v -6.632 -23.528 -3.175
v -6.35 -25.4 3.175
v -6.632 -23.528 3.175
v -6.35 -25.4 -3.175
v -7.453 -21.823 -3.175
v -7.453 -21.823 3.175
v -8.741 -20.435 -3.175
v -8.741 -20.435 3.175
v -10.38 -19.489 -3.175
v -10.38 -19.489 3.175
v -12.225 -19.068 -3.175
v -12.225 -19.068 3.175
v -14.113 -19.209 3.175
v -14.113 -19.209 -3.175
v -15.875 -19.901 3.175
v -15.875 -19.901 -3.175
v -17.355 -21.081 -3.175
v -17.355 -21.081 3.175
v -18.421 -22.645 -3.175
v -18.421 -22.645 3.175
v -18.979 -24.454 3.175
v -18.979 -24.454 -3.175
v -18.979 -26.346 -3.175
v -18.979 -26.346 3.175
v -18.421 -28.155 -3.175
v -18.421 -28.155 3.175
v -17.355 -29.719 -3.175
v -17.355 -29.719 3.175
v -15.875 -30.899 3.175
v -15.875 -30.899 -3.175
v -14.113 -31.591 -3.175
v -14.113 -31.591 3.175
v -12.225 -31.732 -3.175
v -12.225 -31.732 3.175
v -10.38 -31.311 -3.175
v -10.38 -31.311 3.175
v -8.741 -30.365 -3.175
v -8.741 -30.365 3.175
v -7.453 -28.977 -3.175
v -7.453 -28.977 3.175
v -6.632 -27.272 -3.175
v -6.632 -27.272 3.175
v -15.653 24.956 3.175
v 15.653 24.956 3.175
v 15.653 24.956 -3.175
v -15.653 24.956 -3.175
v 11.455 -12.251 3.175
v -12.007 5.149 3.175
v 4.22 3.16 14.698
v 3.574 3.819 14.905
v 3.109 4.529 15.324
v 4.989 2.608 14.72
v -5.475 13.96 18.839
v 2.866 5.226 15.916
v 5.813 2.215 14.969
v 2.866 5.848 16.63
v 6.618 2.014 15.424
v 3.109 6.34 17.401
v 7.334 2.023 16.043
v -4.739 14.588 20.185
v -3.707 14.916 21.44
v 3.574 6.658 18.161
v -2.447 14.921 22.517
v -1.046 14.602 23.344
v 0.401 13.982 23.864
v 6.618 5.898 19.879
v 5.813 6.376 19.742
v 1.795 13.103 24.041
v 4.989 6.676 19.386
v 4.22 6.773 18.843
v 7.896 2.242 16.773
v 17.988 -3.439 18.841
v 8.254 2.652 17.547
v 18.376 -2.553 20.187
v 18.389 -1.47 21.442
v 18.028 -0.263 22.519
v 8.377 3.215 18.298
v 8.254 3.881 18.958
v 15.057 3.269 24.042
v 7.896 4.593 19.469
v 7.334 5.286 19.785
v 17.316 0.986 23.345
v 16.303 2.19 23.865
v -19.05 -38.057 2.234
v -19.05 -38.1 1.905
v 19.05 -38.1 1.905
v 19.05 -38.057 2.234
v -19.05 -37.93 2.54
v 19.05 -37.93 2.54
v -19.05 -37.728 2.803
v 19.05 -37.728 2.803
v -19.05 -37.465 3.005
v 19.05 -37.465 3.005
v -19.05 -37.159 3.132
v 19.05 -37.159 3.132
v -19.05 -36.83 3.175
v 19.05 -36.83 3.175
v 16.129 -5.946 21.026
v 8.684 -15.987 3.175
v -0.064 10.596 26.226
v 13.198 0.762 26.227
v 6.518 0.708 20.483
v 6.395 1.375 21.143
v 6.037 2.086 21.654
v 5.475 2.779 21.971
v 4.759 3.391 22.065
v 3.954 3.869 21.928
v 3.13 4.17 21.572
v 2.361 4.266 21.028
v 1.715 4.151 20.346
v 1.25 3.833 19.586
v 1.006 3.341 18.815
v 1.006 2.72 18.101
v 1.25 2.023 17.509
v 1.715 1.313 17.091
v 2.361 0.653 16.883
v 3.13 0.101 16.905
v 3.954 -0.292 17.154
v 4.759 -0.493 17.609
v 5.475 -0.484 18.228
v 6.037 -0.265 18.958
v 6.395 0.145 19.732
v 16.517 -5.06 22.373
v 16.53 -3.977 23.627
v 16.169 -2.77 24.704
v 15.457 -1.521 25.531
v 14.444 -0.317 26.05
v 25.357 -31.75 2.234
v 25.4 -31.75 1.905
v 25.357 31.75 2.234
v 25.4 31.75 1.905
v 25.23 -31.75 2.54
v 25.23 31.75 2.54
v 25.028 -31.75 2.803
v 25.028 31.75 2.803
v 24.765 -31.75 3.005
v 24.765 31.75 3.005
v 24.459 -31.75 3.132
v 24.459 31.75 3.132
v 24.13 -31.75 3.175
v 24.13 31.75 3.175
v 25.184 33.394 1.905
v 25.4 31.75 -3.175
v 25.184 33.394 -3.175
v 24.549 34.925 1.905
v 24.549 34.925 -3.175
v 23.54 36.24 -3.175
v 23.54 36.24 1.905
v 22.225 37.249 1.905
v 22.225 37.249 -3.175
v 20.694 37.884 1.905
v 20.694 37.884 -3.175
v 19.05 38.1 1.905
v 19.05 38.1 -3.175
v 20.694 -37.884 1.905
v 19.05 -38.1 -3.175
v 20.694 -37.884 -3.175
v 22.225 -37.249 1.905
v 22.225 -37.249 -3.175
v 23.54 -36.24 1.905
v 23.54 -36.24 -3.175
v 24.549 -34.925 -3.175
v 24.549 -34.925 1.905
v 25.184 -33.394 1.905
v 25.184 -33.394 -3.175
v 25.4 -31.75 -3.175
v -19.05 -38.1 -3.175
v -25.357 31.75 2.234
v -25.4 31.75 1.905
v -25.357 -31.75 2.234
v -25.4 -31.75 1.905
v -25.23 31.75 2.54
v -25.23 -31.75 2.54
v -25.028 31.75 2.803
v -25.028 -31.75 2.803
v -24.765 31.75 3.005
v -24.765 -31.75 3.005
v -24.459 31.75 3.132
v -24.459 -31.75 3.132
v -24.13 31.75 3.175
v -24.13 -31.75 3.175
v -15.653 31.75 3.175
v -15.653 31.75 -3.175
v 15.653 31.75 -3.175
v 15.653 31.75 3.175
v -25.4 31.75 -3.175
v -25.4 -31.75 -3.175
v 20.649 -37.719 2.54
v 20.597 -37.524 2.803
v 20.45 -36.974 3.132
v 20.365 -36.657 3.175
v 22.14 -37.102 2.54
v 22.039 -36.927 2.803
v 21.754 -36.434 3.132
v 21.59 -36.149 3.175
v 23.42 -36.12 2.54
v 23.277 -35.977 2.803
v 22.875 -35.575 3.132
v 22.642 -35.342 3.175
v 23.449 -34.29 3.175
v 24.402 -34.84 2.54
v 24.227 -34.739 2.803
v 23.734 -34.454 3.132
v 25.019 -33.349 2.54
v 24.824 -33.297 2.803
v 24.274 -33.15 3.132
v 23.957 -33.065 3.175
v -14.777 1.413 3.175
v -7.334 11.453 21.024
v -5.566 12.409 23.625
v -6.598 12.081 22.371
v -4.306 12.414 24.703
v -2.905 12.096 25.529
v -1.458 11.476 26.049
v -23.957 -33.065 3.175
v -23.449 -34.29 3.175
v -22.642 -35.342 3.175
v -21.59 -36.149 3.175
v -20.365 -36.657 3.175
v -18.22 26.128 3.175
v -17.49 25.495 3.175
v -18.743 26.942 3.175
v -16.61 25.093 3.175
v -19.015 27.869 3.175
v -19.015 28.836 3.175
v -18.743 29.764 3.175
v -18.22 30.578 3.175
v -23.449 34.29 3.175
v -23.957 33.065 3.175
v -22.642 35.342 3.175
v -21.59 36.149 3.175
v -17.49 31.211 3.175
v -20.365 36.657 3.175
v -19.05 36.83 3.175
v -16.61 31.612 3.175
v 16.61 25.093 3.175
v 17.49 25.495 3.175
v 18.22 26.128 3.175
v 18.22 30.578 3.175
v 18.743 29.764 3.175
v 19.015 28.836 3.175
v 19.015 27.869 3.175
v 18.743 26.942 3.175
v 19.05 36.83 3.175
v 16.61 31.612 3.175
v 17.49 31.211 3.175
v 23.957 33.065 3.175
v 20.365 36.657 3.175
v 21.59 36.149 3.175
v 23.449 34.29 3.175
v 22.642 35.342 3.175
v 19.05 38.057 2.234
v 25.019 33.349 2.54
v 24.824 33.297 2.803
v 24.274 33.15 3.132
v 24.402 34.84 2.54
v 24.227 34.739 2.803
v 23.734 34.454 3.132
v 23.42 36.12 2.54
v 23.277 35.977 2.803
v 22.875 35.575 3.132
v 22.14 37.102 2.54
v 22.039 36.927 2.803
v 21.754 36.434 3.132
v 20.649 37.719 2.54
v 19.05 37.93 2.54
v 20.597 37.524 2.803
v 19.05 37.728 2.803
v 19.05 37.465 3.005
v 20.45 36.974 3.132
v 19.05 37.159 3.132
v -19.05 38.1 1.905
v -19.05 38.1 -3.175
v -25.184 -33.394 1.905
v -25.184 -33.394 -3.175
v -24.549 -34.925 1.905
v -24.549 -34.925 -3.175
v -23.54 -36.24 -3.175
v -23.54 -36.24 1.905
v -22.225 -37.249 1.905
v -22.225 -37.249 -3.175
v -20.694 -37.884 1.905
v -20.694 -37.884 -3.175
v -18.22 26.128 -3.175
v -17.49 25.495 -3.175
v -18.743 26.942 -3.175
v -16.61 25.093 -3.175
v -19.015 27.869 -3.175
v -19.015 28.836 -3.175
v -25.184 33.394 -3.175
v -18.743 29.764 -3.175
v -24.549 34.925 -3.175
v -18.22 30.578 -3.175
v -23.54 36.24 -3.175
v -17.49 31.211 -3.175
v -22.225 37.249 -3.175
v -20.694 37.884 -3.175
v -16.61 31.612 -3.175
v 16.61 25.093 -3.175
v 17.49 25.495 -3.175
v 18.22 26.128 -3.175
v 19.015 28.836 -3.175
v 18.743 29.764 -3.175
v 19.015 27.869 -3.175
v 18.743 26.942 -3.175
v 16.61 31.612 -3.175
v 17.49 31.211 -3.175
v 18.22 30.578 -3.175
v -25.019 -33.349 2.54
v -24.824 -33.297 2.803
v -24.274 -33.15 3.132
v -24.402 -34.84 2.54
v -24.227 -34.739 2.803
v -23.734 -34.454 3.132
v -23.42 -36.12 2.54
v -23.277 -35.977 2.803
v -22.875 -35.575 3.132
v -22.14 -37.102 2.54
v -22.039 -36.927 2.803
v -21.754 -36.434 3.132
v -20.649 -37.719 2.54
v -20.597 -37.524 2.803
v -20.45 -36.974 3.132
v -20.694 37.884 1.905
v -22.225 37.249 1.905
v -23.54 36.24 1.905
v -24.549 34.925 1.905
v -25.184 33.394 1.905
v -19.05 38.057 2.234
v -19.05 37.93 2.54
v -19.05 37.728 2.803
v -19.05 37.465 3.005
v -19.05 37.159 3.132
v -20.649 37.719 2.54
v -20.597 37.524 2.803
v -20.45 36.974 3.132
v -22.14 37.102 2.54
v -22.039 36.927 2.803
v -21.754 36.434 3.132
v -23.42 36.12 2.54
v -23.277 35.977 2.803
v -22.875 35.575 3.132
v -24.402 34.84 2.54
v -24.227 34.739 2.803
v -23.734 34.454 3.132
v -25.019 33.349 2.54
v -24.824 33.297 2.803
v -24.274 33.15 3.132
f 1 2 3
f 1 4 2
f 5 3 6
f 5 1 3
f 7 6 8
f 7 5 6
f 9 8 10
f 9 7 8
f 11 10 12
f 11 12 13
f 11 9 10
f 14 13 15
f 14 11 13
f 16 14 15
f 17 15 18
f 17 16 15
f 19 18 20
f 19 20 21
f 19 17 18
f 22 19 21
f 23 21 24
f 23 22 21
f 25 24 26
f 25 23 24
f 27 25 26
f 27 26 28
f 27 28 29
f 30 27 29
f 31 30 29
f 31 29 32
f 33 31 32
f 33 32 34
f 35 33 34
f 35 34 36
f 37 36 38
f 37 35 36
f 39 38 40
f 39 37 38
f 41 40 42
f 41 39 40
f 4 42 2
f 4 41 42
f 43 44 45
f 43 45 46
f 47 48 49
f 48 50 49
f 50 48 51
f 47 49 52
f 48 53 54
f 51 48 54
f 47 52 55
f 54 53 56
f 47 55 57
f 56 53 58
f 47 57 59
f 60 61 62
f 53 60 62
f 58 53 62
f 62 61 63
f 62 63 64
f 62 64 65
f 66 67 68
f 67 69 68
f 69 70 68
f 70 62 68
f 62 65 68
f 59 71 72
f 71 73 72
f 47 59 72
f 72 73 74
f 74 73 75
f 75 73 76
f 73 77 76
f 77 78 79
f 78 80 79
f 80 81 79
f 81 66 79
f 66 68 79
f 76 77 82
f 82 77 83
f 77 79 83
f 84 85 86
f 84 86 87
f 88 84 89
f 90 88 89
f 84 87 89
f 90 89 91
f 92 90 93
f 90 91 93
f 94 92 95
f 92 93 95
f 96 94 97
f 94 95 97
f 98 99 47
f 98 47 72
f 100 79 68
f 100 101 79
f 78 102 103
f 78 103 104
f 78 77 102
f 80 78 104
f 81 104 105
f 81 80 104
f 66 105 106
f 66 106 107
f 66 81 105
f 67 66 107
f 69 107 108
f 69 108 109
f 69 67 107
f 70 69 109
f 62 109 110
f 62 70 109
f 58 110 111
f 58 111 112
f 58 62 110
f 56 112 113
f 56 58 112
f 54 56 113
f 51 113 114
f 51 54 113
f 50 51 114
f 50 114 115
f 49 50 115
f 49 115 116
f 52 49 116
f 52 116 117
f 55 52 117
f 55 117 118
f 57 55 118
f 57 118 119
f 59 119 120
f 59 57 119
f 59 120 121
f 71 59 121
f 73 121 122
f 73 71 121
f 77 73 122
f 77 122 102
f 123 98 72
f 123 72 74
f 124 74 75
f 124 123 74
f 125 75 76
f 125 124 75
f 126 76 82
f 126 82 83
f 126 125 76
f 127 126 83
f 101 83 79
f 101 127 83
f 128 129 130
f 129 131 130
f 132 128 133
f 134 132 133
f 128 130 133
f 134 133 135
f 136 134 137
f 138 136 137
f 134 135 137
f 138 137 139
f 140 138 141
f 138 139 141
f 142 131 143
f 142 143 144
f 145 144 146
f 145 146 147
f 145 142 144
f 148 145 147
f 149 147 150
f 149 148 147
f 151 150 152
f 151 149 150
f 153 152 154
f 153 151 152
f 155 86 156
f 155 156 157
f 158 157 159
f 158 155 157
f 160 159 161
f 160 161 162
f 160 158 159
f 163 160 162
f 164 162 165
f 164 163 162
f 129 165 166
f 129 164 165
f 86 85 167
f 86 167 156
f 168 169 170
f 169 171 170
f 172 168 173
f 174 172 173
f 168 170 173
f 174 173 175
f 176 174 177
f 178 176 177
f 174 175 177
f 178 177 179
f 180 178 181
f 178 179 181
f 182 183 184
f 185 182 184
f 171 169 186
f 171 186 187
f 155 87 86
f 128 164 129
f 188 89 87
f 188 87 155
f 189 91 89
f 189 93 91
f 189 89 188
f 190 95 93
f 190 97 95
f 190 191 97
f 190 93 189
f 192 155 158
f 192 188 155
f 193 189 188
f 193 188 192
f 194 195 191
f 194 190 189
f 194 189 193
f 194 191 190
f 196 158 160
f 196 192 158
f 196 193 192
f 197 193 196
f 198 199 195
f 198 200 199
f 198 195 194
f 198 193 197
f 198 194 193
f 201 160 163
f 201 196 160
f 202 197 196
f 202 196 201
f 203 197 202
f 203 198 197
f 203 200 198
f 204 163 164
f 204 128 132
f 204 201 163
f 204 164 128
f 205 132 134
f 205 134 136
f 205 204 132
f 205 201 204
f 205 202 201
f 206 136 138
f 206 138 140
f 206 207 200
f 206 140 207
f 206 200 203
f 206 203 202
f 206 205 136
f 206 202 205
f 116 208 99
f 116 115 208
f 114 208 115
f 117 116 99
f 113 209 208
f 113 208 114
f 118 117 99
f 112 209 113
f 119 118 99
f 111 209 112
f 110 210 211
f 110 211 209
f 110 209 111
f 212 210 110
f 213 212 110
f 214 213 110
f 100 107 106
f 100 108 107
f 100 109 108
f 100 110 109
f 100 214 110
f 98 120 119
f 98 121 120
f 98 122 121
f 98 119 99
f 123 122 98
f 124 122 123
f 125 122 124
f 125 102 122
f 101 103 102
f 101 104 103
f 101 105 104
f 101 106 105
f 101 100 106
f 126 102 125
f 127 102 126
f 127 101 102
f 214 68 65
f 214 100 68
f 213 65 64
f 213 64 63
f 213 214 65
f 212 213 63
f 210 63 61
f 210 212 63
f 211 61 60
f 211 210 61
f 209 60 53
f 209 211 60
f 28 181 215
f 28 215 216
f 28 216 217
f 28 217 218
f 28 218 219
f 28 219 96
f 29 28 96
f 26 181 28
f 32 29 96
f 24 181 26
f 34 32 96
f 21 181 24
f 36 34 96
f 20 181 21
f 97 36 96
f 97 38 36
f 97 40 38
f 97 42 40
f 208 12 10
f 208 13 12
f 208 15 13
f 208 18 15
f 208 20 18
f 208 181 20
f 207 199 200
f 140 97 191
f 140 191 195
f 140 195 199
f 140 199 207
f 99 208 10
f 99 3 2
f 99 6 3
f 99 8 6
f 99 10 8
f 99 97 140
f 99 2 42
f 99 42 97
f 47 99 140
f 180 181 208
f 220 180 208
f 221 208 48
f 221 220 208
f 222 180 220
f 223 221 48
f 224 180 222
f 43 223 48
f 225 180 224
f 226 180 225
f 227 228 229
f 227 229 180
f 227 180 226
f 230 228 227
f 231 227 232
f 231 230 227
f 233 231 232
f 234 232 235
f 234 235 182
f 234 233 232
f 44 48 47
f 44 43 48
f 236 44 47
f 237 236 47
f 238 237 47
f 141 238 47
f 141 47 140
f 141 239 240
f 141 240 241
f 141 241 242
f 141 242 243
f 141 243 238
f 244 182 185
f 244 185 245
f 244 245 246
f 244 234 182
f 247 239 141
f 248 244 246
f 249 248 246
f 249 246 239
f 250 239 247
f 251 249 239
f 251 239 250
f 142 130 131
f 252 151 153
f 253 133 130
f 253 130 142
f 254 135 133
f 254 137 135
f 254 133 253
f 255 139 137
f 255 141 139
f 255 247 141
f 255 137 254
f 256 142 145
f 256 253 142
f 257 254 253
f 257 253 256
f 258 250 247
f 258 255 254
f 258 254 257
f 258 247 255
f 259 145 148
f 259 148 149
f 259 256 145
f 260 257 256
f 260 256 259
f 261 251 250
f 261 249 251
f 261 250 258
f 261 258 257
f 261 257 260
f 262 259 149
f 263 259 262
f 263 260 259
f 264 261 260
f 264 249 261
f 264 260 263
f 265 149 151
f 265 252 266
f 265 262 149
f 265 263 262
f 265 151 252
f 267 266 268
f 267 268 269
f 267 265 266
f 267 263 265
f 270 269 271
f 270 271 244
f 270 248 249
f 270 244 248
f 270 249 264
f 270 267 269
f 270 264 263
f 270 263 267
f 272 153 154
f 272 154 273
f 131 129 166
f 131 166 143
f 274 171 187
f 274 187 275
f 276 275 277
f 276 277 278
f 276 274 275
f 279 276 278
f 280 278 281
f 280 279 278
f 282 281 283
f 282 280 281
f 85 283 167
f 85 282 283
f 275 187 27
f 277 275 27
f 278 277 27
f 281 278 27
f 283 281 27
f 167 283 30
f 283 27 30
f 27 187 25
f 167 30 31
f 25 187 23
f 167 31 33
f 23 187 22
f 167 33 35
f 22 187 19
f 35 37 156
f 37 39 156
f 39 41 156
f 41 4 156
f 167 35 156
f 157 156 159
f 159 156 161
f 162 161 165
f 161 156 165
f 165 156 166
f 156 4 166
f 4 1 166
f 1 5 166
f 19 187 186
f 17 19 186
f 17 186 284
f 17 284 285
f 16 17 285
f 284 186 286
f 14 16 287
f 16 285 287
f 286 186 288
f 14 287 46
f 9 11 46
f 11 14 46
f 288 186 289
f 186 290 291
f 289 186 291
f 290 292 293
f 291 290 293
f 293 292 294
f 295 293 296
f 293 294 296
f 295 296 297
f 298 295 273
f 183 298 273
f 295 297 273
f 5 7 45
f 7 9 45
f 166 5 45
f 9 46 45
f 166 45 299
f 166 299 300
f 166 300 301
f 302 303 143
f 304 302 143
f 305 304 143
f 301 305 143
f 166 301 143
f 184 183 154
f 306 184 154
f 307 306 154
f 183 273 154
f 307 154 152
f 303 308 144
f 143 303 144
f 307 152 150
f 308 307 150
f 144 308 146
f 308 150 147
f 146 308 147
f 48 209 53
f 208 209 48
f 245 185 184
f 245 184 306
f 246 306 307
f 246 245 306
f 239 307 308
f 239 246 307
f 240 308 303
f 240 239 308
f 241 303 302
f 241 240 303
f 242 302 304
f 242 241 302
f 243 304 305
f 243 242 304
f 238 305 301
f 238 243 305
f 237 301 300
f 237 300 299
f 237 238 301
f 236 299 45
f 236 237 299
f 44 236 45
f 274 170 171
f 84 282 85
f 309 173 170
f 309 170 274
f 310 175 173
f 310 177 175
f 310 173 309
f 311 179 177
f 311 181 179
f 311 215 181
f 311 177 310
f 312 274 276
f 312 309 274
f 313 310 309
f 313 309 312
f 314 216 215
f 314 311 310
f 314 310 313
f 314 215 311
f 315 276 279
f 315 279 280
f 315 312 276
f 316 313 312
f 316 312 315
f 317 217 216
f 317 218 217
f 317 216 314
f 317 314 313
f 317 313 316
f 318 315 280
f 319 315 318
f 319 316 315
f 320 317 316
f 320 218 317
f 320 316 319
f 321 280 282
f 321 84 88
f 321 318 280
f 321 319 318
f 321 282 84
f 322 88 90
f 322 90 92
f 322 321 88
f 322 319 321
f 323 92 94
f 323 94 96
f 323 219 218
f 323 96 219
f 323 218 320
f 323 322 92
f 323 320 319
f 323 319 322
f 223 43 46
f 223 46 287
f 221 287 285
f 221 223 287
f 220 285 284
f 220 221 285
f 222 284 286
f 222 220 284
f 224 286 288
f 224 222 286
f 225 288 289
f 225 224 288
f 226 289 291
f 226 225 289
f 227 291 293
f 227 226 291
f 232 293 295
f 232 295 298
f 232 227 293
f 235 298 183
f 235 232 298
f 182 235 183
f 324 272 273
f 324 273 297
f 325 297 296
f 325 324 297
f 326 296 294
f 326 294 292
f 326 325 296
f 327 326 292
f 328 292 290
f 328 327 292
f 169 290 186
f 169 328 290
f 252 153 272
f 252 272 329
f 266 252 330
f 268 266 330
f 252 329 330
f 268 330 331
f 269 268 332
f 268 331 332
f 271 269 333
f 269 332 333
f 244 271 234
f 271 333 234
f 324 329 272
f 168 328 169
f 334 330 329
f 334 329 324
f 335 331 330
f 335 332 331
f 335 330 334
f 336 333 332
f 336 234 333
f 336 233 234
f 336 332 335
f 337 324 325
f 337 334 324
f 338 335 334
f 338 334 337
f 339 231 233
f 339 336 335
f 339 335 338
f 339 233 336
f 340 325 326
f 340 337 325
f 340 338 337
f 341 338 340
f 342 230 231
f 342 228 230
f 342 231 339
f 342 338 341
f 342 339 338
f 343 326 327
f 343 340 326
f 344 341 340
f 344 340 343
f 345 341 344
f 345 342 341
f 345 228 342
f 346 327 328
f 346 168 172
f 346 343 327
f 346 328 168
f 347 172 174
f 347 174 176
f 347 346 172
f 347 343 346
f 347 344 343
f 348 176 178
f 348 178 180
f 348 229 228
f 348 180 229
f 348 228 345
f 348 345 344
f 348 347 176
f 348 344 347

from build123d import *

# Parameters (mm, degrees)
F2_R     = 3.175
F3_DEPTH = 1.905
F0_R     = 6.35
F4_DEPTH = 3.175
F5_R     = 1.27


with BuildPart() as f3:
    # F2 (on face) → F3 (new body, symmetric)
    with BuildSketch(Plane(origin=(-3.023974, -4.077422, 3.55453), x_dir=(0.872864, -0.36782, 0.32065), z_dir=(-0.487963, -0.657953, 0.573576))):
        with BuildLine():
            Line((-3.872431, 23.373911), (-13.813271, 0))
            Line((-13.813271, 0), (13.066727, -11.431966))
            Line((13.066727, -11.431966), (23.007567, 11.941945))
            ThreePointArc((23.007567, 11.941945), (23.05336, 16.801809), (19.649299, 20.270633))
            Line((19.649299, 20.270633), (4.456257, 26.732178))
            ThreePointArc((4.456257, 26.732178), (-0.403607, 26.777972), (-3.872431, 23.373911))
        make_face()
        with Locations((8.822005, 15.904885)):
            Circle(F2_R, mode=Mode.SUBTRACT)
    extrude(amount=F3_DEPTH, both=True)

    # F0 (on Top) → F4 (join, symmetric)
    with BuildSketch(Plane.XY):
        with BuildLine():
            Line((19.05, 38.1), (0, 38.1))
            Line((0, 38.1), (-19.05, 38.1))
            ThreePointArc((-19.05, 38.1), (-23.540128, 36.240128), (-25.4, 31.75))
            Line((-25.4, 31.75), (-25.4, 0))
            Line((-25.4, 0), (-25.4, -31.75))
            ThreePointArc((-25.4, -31.75), (-23.540128, -36.240128), (-19.05, -38.1))
            Line((-19.05, -38.1), (0, -38.1))
            Line((0, -38.1), (19.05, -38.1))
            ThreePointArc((19.05, -38.1), (23.540128, -36.240128), (25.4, -31.75))
            Line((25.4, -31.75), (25.4, 0))
            Line((25.4, 0), (25.4, 31.75))
            ThreePointArc((25.4, 31.75), (23.540128, 36.240128), (19.05, 38.1))
        make_face()
        with Locations((-12.7, -25.4)):
            Circle(F0_R, mode=Mode.SUBTRACT)
        with BuildLine():
            Line((-15.652927, 31.75), (0, 31.75))
            Line((0, 31.75), (15.652927, 31.75))
            ThreePointArc((15.652927, 31.75), (19.05, 28.352927), (15.652927, 24.955855))
            Line((15.652927, 24.955855), (0, 24.955855))
            Line((0, 24.955855), (-15.652927, 24.955855))
            ThreePointArc((-15.652927, 24.955855), (-19.05, 28.352927), (-15.652927, 31.75))
        make_face(mode=Mode.SUBTRACT)
    extrude(amount=F4_DEPTH, both=True)

    # F5
    f5_edges = [f3.edges().sort_by_distance(p)[0] for p in [
        (0, 38.1, 3.175),
        (-23.540128, 36.240128, 3.175),
        (-25.4, 0, 3.175),
        (-23.540128, -36.240128, 3.175),
        (0, -38.1, 3.175),
        (23.540128, -36.240128, 3.175),
        (25.4, 0, 3.175),
        (23.540128, 36.240128, 3.175),
    ]]
    fillet(f5_edges, radius=F5_R)


solid = f3.part
